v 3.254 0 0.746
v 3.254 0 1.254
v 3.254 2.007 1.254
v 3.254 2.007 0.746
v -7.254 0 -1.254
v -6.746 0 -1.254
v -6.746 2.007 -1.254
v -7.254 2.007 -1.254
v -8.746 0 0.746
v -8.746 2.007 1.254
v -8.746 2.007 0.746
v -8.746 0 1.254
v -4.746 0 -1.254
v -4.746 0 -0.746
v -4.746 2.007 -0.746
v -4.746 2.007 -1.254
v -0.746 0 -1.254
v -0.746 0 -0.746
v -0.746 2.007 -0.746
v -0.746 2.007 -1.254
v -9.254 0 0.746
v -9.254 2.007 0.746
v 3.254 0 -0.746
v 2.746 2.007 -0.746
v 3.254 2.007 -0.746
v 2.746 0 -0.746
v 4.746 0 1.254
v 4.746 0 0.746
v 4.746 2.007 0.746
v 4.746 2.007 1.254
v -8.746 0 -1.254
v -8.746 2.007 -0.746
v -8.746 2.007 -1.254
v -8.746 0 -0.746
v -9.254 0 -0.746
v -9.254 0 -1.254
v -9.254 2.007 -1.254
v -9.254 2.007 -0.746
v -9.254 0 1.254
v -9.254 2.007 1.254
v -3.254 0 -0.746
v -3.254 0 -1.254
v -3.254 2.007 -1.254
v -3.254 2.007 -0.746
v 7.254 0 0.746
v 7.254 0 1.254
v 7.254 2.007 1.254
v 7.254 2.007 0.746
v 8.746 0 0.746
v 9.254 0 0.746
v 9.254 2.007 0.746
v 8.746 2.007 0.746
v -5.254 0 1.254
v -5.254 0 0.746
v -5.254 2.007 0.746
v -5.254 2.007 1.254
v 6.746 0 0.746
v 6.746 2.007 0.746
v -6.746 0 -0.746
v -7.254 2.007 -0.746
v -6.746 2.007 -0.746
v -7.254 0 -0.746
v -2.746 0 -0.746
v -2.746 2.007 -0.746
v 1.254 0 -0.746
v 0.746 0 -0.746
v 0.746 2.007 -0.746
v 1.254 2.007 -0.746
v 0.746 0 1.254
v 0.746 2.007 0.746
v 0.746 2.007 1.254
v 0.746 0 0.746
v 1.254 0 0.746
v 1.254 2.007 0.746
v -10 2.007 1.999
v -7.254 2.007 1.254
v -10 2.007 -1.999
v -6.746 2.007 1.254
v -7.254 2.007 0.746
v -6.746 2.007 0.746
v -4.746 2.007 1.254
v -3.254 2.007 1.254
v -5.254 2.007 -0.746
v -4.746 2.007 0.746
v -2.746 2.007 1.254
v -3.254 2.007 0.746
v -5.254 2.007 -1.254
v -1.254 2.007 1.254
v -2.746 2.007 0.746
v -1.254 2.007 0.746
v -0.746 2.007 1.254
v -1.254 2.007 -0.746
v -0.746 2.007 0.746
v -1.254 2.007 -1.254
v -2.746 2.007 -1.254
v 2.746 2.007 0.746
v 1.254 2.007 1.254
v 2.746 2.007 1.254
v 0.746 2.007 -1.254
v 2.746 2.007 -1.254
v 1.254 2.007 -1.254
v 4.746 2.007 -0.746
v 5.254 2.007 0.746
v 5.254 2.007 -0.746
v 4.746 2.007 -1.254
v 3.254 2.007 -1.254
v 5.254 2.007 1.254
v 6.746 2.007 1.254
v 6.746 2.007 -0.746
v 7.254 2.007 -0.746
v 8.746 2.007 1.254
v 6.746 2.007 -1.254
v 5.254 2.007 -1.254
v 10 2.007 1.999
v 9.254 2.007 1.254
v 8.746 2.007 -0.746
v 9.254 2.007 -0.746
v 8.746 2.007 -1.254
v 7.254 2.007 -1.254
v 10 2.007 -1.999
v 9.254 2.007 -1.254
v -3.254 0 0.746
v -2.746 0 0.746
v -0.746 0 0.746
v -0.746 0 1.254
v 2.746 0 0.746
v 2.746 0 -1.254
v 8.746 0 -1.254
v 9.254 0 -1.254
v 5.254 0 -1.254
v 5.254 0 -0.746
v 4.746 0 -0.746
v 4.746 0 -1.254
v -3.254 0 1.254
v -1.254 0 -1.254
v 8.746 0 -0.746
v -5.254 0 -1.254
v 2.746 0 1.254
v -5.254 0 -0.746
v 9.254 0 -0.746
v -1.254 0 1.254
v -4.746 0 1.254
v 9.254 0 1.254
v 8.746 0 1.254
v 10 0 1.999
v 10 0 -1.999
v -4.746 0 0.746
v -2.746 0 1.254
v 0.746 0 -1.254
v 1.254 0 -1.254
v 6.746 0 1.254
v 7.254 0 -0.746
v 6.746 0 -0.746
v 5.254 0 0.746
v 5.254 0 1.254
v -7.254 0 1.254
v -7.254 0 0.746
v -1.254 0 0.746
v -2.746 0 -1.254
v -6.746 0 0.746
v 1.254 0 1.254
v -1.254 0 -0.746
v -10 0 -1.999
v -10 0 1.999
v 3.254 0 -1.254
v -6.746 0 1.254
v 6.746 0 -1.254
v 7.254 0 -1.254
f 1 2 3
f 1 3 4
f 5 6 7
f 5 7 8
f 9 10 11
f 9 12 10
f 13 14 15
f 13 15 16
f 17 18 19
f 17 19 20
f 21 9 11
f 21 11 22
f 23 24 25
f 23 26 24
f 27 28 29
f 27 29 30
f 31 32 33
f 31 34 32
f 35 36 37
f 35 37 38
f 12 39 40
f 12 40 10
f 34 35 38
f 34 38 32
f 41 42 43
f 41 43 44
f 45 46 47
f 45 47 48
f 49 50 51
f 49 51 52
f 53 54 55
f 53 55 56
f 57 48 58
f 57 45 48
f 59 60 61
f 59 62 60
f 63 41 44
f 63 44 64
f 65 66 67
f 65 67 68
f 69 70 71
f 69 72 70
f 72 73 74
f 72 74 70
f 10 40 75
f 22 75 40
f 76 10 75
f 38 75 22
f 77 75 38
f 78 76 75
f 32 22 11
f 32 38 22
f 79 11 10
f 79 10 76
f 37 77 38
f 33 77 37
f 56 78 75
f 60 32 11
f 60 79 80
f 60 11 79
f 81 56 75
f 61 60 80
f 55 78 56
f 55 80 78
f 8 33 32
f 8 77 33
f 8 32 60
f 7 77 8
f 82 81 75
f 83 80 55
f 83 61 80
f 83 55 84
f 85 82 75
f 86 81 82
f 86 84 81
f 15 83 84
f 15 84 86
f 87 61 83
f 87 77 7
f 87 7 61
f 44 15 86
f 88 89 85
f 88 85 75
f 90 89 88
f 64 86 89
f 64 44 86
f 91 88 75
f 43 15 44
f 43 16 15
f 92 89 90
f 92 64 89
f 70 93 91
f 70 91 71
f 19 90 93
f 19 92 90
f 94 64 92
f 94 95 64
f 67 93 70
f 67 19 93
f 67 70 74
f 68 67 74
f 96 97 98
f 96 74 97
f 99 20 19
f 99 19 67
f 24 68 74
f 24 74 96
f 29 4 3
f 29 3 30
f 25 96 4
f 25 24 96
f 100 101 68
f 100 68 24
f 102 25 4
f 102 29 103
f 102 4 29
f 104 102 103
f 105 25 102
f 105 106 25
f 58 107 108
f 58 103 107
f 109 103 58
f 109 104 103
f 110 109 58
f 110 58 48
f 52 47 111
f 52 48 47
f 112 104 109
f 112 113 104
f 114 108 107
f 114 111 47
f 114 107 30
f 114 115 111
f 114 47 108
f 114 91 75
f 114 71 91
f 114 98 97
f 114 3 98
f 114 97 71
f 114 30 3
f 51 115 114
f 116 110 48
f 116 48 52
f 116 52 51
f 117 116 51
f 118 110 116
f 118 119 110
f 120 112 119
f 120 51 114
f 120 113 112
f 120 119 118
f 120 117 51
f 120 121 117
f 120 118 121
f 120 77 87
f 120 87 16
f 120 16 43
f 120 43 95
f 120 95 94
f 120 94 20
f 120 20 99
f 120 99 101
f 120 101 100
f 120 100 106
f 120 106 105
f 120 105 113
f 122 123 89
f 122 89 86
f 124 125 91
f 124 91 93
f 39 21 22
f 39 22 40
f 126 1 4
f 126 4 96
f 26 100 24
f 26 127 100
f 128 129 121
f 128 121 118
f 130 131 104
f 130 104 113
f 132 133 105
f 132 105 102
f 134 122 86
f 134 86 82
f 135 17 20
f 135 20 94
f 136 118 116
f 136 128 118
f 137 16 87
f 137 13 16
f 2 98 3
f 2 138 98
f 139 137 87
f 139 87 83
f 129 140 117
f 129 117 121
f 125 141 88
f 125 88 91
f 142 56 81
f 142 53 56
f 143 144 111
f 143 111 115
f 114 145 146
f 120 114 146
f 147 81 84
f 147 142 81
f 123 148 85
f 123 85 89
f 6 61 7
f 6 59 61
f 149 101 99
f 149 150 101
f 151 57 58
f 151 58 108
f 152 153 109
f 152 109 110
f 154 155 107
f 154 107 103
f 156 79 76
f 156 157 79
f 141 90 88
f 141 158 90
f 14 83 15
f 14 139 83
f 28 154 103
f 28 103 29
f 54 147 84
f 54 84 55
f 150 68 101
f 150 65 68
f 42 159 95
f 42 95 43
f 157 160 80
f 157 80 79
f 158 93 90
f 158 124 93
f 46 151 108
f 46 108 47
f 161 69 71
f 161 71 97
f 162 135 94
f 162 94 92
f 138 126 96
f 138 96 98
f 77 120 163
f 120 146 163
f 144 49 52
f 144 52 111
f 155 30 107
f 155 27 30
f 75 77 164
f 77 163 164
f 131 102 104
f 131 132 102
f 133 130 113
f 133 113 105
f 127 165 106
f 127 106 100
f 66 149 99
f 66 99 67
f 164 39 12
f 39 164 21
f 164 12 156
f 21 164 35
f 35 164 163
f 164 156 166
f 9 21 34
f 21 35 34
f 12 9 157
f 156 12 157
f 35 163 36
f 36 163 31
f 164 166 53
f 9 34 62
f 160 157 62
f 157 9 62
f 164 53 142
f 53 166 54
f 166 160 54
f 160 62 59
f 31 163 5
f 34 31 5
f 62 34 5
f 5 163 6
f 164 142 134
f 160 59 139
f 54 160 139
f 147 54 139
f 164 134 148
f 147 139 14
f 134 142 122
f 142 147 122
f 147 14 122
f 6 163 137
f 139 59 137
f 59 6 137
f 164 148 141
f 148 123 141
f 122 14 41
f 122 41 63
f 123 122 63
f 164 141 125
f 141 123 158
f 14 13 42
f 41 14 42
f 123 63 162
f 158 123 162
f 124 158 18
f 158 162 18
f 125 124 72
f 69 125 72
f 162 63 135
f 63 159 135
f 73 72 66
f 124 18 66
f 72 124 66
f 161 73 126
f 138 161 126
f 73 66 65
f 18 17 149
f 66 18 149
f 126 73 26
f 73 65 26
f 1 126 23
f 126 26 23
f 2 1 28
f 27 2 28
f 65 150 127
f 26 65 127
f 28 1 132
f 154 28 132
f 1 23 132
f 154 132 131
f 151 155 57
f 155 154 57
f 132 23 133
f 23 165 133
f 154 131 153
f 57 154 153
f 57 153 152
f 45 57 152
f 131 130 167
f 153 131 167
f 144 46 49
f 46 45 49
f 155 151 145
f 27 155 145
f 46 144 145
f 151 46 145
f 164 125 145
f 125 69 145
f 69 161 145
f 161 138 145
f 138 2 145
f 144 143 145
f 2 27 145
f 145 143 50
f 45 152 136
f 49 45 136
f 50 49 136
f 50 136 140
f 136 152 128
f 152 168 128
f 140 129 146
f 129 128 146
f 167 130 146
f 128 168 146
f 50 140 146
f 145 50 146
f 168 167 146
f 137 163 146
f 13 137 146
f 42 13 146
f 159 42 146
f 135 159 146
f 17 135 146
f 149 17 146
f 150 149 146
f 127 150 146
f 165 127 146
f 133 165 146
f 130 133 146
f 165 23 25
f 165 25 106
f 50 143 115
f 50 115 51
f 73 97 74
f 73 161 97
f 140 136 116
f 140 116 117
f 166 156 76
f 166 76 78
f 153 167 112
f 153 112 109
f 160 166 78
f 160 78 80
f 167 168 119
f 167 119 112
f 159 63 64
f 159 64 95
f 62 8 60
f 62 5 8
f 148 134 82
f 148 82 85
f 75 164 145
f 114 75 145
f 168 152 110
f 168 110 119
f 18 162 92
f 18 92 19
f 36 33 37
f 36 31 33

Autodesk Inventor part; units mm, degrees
sketch "Sketch0" plane through (0, 0, 0) normal (0, 1, 0) x (1, 0, 0)
  line L0 (-10, -1.999) -> (10, -1.999)
  line L1 (10, -1.999) -> (10, 1.999)
  line L2 (10, 1.999) -> (-10, 1.999)
  line L3 (-10, 1.999) -> (-10, -1.999)
  line L4 (8.746, 0.746) -> (9.254, 0.746)
  line L5 (9.254, 0.746) -> (9.254, 1.254)
  line L6 (9.254, 1.254) -> (8.746, 1.254)
  line L7 (8.746, 1.254) -> (8.746, 0.746)
  line L8 (8.746, -1.254) -> (9.254, -1.254)
  line L9 (9.254, -1.254) -> (9.254, -0.746)
  line L10 (9.254, -0.746) -> (8.746, -0.746)
  line L11 (8.746, -0.746) -> (8.746, -1.254)
  line L12 (6.746, 0.746) -> (7.254, 0.746)
  line L13 (7.254, 0.746) -> (7.254, 1.254)
  line L14 (7.254, 1.254) -> (6.746, 1.254)
  line L15 (6.746, 1.254) -> (6.746, 0.746)
  line L16 (6.746, -1.254) -> (7.254, -1.254)
  line L17 (7.254, -1.254) -> (7.254, -0.746)
  line L18 (7.254, -0.746) -> (6.746, -0.746)
  line L19 (6.746, -0.746) -> (6.746, -1.254)
  line L20 (4.746, 0.746) -> (5.254, 0.746)
  line L21 (5.254, 0.746) -> (5.254, 1.254)
  line L22 (5.254, 1.254) -> (4.746, 1.254)
  line L23 (4.746, 1.254) -> (4.746, 0.746)
  line L24 (4.746, -1.254) -> (5.254, -1.254)
  line L25 (5.254, -1.254) -> (5.254, -0.746)
  line L26 (5.254, -0.746) -> (4.746, -0.746)
  line L27 (4.746, -0.746) -> (4.746, -1.254)
  line L28 (2.746, 0.746) -> (3.254, 0.746)
  line L29 (3.254, 0.746) -> (3.254, 1.254)
  line L30 (3.254, 1.254) -> (2.746, 1.254)
  line L31 (2.746, 1.254) -> (2.746, 0.746)
  line L32 (2.746, -1.254) -> (3.254, -1.254)
  line L33 (3.254, -1.254) -> (3.254, -0.746)
  line L34 (3.254, -0.746) -> (2.746, -0.746)
  line L35 (2.746, -0.746) -> (2.746, -1.254)
  line L36 (0.746, 0.746) -> (1.254, 0.746)
  line L37 (1.254, 0.746) -> (1.254, 1.254)
  line L38 (1.254, 1.254) -> (0.746, 1.254)
  line L39 (0.746, 1.254) -> (0.746, 0.746)
  line L40 (0.746, -1.254) -> (1.254, -1.254)
  line L41 (1.254, -1.254) -> (1.254, -0.746)
  line L42 (1.254, -0.746) -> (0.746, -0.746)
  line L43 (0.746, -0.746) -> (0.746, -1.254)
  line L44 (-1.254, 0.746) -> (-0.746, 0.746)
  line L45 (-0.746, 0.746) -> (-0.746, 1.254)
  line L46 (-0.746, 1.254) -> (-1.254, 1.254)
  line L47 (-1.254, 1.254) -> (-1.254, 0.746)
  line L48 (-1.254, -1.254) -> (-0.746, -1.254)
  line L49 (-0.746, -1.254) -> (-0.746, -0.746)
  line L50 (-0.746, -0.746) -> (-1.254, -0.746)
  line L51 (-1.254, -0.746) -> (-1.254, -1.254)
  line L52 (-3.254, 0.746) -> (-2.746, 0.746)
  line L53 (-2.746, 0.746) -> (-2.746, 1.254)
  line L54 (-2.746, 1.254) -> (-3.254, 1.254)
  line L55 (-3.254, 1.254) -> (-3.254, 0.746)
  line L56 (-3.254, -1.254) -> (-2.746, -1.254)
  line L57 (-2.746, -1.254) -> (-2.746, -0.746)
  line L58 (-2.746, -0.746) -> (-3.254, -0.746)
  line L59 (-3.254, -0.746) -> (-3.254, -1.254)
  line L60 (-5.254, 0.746) -> (-4.746, 0.746)
  line L61 (-4.746, 0.746) -> (-4.746, 1.254)
  line L62 (-4.746, 1.254) -> (-5.254, 1.254)
  line L63 (-5.254, 1.254) -> (-5.254, 0.746)
  line L64 (-5.254, -1.254) -> (-4.746, -1.254)
  line L65 (-4.746, -1.254) -> (-4.746, -0.746)
  line L66 (-4.746, -0.746) -> (-5.254, -0.746)
  line L67 (-5.254, -0.746) -> (-5.254, -1.254)
  line L68 (-7.254, 0.746) -> (-6.746, 0.746)
  line L69 (-6.746, 0.746) -> (-6.746, 1.254)
  line L70 (-6.746, 1.254) -> (-7.254, 1.254)
  line L71 (-7.254, 1.254) -> (-7.254, 0.746)
  line L72 (-7.254, -1.254) -> (-6.746, -1.254)
  line L73 (-6.746, -1.254) -> (-6.746, -0.746)
  line L74 (-6.746, -0.746) -> (-7.254, -0.746)
  line L75 (-7.254, -0.746) -> (-7.254, -1.254)
  line L76 (-9.254, 0.746) -> (-8.746, 0.746)
  line L77 (-8.746, 0.746) -> (-8.746, 1.254)
  line L78 (-8.746, 1.254) -> (-9.254, 1.254)
  line L79 (-9.254, 1.254) -> (-9.254, 0.746)
  line L80 (-9.254, -1.254) -> (-8.746, -1.254)
  line L81 (-8.746, -1.254) -> (-8.746, -0.746)
  line L82 (-8.746, -0.746) -> (-9.254, -0.746)
  line L83 (-9.254, -0.746) -> (-9.254, -1.254)
extrude "Extrusion1" add sketch "Sketch0" along normal blind 2.0066
ref_plane "0_XY" through (0, 0, 0) normal (0, 1, 0) x (1, 0, 0)
ref_plane "0_YZ" through (0, 0, 0) normal (1, 0, 0) x (0, 0, -1)
ref_plane "0_ZX" through (0, 0, 0) normal (0, 0, -1) x (0, 1, 0)
properties part number "BB1TW-10-11-T-D-250-080"
